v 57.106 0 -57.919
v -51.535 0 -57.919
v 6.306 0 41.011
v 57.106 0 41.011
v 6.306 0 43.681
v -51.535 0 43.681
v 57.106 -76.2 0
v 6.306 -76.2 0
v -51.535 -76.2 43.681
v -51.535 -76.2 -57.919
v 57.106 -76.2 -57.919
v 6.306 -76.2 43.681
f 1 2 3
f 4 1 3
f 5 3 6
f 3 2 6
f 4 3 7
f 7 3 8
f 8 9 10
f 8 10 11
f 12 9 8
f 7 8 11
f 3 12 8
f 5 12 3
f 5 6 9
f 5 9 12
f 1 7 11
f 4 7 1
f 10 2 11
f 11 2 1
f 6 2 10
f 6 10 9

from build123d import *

# Parameters (mm, degrees)
F0_W     = 108.6415843582
F0_H     = 101.6
F1_DEPTH = 76.2
F2_W     = 76.2
F2_H     = 43.6811229765
F3_DEPTH = 50.8
F5_DEPTH = 50.8


with BuildPart() as f1:
    # F0 (on Front) → F1 (new body)
    with BuildSketch(Plane.XZ):
        with Locations((2.785647288, -7.1188770235)):
            Rectangle(F0_W, F0_H)
    extrude(amount=F1_DEPTH)

    # F2 (on face) → F3 (cut)
    with BuildSketch(Plane.YZ.offset(57.1064394671)):
        with Locations((-38.1, 21.8405614883)):
            Rectangle(F2_W, F2_H)
    extrude(amount=-F3_DEPTH, mode=Mode.SUBTRACT)

    # F4 (on face) → F5 (join)
    with BuildSketch(Plane.YZ.offset(6.3064394671)):
        Polygon((0, 0), (0, 41.0109274089), (-76.2, 0), align=None)
    extrude(amount=F5_DEPTH)


solid = f1.part
